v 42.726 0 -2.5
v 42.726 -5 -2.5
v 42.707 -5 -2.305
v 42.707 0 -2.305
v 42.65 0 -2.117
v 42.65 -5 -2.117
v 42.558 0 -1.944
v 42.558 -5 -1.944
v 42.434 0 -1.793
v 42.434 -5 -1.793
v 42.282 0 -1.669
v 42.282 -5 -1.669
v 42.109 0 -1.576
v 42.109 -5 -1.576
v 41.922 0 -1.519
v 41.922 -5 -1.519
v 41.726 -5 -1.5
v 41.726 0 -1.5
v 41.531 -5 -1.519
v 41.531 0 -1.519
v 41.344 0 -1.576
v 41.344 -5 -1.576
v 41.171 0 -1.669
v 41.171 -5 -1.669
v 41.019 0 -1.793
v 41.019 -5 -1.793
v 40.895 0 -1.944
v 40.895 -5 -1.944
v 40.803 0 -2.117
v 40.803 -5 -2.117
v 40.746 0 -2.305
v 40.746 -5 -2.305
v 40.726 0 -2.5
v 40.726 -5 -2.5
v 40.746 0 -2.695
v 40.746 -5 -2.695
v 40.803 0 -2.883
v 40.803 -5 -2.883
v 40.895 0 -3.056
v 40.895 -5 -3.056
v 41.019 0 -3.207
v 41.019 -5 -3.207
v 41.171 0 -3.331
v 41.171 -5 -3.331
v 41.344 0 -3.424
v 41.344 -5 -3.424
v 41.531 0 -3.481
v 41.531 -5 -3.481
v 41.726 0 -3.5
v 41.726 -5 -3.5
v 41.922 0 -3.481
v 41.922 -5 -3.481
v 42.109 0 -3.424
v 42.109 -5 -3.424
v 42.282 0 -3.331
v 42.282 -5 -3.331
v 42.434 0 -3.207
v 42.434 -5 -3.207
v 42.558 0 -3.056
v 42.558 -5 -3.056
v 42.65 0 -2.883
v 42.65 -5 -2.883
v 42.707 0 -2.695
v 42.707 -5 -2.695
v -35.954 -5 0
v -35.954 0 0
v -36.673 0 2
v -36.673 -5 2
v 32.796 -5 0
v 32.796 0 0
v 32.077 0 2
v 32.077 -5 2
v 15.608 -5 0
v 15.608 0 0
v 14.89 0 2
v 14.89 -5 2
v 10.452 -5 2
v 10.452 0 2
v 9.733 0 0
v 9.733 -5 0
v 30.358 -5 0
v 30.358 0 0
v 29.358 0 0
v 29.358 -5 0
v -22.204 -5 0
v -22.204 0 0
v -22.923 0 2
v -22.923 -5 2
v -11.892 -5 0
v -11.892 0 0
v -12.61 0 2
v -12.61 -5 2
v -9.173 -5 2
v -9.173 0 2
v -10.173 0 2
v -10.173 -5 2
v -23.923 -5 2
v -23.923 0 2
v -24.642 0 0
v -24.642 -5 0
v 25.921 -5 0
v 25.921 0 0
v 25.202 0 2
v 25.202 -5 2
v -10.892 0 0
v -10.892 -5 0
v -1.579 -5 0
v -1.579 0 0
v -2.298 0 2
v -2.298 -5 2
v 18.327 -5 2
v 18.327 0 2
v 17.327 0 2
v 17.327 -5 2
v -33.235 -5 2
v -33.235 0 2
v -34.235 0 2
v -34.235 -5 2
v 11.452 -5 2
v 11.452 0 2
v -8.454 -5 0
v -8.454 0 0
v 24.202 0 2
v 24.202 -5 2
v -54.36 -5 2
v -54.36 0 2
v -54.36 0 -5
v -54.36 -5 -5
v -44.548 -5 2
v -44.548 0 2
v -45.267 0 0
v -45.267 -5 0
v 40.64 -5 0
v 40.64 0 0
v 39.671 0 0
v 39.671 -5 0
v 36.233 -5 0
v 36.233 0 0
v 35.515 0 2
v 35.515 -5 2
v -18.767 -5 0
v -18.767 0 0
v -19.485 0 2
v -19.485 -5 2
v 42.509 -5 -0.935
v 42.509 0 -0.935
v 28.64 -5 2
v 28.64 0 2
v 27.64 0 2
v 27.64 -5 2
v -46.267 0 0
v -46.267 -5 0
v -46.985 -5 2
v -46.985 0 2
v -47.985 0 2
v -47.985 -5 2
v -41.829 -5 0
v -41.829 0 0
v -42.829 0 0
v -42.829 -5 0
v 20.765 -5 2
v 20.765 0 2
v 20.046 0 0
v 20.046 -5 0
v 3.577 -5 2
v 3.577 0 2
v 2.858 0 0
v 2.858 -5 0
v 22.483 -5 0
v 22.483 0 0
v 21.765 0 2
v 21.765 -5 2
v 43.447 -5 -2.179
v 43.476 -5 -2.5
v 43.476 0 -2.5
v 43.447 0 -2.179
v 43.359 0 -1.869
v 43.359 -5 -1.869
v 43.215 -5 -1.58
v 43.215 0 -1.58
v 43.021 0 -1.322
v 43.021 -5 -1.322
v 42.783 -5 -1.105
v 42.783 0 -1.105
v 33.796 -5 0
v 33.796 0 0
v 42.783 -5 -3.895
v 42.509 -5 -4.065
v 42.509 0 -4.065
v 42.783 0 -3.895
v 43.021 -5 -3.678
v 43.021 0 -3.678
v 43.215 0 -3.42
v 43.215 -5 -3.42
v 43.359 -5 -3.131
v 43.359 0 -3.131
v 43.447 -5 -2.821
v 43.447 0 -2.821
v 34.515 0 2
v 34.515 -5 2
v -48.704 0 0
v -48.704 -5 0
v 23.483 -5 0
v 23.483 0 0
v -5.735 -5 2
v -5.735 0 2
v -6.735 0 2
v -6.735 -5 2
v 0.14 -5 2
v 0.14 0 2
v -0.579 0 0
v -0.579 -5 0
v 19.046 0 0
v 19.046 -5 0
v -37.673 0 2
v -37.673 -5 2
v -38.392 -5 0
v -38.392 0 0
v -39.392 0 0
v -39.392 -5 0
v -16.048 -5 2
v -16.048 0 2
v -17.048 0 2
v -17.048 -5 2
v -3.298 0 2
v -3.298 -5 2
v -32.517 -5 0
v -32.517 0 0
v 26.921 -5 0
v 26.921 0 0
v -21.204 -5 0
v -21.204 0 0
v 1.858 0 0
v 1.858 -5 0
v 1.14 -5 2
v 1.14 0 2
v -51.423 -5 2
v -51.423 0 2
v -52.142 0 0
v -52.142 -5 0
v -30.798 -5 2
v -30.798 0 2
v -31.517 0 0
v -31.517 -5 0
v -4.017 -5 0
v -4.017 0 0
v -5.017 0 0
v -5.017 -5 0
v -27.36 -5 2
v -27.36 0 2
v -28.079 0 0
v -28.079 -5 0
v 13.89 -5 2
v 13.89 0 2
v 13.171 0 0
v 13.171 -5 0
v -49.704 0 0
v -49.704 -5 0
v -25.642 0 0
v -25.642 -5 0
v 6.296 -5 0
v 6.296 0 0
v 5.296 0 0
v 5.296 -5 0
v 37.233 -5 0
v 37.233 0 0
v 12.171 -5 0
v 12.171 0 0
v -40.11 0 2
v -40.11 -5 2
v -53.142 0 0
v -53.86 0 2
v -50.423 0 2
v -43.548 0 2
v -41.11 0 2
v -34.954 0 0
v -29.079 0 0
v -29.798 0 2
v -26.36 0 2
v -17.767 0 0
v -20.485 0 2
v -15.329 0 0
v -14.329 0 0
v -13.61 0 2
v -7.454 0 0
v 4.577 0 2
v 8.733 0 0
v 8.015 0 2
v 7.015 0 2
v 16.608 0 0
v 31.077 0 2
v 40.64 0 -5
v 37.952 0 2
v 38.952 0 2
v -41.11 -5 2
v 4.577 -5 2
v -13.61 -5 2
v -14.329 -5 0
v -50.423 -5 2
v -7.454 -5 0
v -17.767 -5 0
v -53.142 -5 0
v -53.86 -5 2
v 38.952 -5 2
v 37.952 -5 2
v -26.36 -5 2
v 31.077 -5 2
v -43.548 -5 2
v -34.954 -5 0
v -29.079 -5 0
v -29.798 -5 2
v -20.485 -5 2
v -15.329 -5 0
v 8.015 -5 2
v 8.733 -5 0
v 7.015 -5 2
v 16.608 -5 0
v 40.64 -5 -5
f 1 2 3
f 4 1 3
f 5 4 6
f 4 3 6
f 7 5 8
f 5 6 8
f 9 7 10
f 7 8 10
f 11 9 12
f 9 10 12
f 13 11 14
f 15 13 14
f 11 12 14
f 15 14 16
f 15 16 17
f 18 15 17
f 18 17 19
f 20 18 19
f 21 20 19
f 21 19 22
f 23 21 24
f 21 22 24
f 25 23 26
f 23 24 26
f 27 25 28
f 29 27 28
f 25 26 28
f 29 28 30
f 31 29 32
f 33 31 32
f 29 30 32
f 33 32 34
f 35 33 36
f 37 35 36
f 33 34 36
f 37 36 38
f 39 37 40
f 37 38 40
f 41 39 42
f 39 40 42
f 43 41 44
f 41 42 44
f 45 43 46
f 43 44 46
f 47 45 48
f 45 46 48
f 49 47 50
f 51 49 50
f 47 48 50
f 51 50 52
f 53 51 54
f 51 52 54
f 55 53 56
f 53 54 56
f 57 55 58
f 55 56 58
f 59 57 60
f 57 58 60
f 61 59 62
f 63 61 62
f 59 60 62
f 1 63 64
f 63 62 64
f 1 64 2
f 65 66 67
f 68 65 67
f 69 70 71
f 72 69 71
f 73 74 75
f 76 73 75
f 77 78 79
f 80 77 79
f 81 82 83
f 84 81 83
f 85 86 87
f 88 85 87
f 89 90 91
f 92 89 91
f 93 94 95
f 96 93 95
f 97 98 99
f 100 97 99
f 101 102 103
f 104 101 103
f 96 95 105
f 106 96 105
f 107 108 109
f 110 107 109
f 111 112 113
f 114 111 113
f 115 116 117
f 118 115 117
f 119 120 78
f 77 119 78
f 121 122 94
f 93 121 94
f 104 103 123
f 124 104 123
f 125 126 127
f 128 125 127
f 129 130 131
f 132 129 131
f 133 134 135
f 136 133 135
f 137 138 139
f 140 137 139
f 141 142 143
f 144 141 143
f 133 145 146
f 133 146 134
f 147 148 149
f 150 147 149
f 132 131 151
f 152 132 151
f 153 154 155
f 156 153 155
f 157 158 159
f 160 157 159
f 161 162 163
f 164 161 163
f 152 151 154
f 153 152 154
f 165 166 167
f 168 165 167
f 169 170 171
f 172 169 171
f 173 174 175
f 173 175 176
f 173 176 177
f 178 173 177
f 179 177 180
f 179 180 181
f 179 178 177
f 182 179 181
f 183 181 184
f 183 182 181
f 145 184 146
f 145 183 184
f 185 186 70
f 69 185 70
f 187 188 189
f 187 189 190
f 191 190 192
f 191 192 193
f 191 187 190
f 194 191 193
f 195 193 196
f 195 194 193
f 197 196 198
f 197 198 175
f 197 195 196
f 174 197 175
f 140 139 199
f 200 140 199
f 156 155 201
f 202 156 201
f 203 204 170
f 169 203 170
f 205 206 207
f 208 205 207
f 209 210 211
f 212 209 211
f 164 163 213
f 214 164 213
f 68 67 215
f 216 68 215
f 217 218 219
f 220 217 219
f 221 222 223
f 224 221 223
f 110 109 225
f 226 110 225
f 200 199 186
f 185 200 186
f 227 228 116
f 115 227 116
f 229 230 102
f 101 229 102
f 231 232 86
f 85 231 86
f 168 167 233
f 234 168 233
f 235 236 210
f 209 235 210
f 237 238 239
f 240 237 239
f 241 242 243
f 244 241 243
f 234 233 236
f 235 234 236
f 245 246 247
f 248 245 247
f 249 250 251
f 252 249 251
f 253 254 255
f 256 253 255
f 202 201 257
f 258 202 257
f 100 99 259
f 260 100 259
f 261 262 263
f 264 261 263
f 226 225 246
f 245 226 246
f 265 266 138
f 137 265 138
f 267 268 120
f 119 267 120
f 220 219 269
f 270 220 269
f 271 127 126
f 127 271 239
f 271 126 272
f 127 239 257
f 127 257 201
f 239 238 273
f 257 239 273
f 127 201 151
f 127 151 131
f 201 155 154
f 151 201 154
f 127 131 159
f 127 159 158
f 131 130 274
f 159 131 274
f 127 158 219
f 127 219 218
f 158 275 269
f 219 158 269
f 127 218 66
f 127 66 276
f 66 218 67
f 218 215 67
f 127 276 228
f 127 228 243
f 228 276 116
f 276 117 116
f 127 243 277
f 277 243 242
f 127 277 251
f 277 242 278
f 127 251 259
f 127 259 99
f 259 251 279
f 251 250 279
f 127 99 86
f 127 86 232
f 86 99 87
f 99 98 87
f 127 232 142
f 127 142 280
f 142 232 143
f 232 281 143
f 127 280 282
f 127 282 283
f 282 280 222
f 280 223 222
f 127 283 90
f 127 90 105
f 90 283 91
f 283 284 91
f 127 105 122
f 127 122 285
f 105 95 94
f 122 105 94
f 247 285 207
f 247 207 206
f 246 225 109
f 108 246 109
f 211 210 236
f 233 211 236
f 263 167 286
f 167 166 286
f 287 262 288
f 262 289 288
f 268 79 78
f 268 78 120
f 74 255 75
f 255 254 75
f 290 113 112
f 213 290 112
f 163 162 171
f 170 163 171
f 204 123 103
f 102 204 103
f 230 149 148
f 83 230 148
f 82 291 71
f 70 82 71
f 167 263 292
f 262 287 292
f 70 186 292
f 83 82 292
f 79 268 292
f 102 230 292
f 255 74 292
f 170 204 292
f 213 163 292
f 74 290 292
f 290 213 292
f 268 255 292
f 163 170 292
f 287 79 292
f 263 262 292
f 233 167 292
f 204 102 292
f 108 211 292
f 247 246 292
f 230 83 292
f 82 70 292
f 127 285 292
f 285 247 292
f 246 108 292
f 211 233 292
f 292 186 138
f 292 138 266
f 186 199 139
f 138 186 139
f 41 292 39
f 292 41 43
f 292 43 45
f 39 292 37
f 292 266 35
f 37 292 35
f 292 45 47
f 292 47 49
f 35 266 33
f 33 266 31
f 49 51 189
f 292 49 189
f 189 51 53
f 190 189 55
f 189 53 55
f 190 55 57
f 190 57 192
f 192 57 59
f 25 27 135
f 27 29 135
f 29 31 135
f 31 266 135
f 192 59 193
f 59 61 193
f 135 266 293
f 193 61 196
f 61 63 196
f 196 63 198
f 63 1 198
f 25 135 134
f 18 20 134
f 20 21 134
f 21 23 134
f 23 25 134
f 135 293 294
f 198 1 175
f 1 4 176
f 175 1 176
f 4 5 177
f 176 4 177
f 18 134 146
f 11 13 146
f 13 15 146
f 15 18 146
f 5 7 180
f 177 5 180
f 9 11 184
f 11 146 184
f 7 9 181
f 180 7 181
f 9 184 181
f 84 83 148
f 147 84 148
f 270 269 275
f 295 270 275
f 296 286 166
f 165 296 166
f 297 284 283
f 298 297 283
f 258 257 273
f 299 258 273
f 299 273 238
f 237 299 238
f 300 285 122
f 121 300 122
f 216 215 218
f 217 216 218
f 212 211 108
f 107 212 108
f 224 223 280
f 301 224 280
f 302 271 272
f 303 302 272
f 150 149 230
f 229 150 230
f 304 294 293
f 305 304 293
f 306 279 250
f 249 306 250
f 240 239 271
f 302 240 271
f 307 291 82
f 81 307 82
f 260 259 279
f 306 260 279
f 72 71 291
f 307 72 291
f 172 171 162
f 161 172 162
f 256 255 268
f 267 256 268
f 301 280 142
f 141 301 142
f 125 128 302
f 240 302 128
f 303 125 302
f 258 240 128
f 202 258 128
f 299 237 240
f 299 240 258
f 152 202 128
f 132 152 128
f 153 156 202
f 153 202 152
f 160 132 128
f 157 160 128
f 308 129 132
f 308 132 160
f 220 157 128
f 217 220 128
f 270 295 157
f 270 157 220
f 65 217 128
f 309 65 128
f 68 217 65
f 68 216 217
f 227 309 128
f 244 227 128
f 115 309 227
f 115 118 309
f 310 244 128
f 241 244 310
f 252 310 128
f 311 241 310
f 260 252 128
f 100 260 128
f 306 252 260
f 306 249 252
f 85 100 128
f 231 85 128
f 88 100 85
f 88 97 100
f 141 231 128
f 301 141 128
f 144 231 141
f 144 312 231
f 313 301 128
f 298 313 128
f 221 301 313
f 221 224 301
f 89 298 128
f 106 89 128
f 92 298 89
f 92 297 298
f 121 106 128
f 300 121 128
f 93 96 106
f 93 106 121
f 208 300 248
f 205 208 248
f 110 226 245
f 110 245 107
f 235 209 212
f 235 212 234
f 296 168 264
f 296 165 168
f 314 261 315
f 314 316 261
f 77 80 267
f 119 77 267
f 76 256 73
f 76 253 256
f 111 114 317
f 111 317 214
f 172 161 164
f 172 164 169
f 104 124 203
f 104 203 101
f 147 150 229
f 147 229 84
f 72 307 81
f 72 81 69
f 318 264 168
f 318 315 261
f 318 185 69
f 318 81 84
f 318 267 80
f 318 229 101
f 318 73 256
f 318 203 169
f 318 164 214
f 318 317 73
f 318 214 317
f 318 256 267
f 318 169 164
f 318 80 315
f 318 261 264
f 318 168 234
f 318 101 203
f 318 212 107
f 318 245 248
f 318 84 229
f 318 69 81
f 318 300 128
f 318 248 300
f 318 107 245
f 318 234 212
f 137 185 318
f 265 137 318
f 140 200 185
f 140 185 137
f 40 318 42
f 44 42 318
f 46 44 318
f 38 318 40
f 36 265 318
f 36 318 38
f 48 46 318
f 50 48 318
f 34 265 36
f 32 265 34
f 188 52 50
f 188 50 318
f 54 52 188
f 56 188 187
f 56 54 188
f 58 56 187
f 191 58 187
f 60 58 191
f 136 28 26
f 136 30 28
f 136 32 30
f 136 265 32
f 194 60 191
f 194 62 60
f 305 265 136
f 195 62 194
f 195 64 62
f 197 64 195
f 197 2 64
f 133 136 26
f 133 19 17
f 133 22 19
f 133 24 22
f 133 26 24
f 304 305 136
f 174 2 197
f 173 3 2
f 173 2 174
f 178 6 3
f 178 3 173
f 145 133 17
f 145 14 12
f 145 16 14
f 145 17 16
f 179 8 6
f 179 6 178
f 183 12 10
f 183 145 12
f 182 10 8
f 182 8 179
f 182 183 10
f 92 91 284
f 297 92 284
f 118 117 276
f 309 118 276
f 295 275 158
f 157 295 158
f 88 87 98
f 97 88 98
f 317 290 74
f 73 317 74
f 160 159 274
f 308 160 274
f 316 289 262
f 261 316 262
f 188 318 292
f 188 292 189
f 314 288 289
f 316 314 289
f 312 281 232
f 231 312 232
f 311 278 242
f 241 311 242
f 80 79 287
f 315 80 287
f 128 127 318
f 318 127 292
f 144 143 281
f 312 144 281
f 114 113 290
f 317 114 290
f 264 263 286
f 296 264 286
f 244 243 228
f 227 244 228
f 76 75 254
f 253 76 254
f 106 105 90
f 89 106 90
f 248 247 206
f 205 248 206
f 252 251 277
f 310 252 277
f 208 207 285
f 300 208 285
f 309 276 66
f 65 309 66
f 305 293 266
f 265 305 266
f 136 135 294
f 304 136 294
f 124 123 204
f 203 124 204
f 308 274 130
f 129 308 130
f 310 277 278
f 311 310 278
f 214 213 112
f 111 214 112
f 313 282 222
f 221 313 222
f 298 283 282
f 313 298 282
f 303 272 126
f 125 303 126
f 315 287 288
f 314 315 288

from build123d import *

# Parameters (mm, degrees)
F1_DEPTH = 5
F3_DEPTH = 25
F4_R     = 1
F5_DEPTH = 5


with BuildPart() as f1:
    # F0 (on Front) → F1 (new body)
    with BuildSketch(Plane.XZ):
        Polygon((-54.360465, 2), (-54.360465, 0), (-53.141715, 0), (-53.860465, 2), align=None)
        Polygon((-53.141715, 0), (-54.360465, 0), (-54.360465, -5), (55.639535, -5), (55.639535, 0), (54.420785, 0), (53.920785, 0), (53.420785, 0), (50.983285, 0), (50.483285, 0), (49.983285, 0), (47.545785, 0), (47.045785, 0), (46.545785, 0), (44.108285, 0), (43.608285, 0), (43.108285, 0), (40.670785, 0), (40.170785, 0), (39.670785, 0), (37.233285, 0), (36.733285, 0), (36.233285, 0), (33.795785, 0), (33.295785, 0), (32.795785, 0), (30.358285, 0), (29.858285, 0), (29.358285, 0), (26.920785, 0), (26.420785, 0), (25.920785, 0), (23.483285, 0), (22.983285, 0), (22.483285, 0), (20.045785, 0), (19.545785, 0), (19.045785, 0), (16.608285, 0), (16.108285, 0), (15.608285, 0), (13.170785, 0), (12.670785, 0), (12.170785, 0), (9.733285, 0), (9.233285, 0), (8.733285, 0), (6.295785, 0), (5.795785, 0), (5.295785, 0), (2.858285, 0), (2.358285, 0), (1.858285, 0), (-0.579215, 0), (-1.079215, 0), (-1.579215, 0), (-4.016715, 0), (-4.516715, 0), (-5.016715, 0), (-7.454215, 0), (-7.954215, 0), (-8.454215, 0), (-10.891715, 0), (-11.391715, 0), (-11.891715, 0), (-14.329215, 0), (-14.829215, 0), (-15.329215, 0), (-17.766715, 0), (-18.266715, 0), (-18.766715, 0), (-21.204215, 0), (-21.704215, 0), (-22.204215, 0), (-24.641715, 0), (-25.141715, 0), (-25.641715, 0), (-28.079215, 0), (-28.579215, 0), (-29.079215, 0), (-31.516715, 0), (-32.016715, 0), (-32.516715, 0), (-34.954215, 0), (-35.454215, 0), (-35.954215, 0), (-38.391715, 0), (-38.891715, 0), (-39.391715, 0), (-41.829215, 0), (-42.329215, 0), (-42.829215, 0), (-45.266715, 0), (-45.766715, 0), (-46.266715, 0), (-48.704215, 0), (-49.204215, 0), (-49.704215, 0), (-52.141715, 0), (-52.641715, 0), align=None)
        Polygon((-51.422965, 2), (-52.141715, 0), (-49.704215, 0), (-50.422965, 2), (-50.922965, 2), align=None)
        Polygon((54.420785, 0), (55.639535, 0), (55.639535, 2), (55.139535, 2), align=None)
        Polygon((-47.985465, 2), (-48.704215, 0), (-46.266715, 0), (-46.985465, 2), (-47.485465, 2), align=None)
        Polygon((50.983285, 0), (53.420785, 0), (52.702035, 2), (52.202035, 2), (51.702035, 2), align=None)
        Polygon((-44.547965, 2), (-45.266715, 0), (-42.829215, 0), (-43.547965, 2), (-44.047965, 2), align=None)
        Polygon((47.545785, 0), (49.983285, 0), (49.264535, 2), (48.764535, 2), (48.264535, 2), align=None)
        Polygon((-41.110465, 2), (-41.829215, 0), (-39.391715, 0), (-40.110465, 2), (-40.610465, 2), align=None)
        Polygon((44.108285, 0), (46.545785, 0), (45.827035, 2), (45.327035, 2), (44.827035, 2), align=None)
        Polygon((-37.672965, 2), (-38.391715, 0), (-35.954215, 0), (-36.672965, 2), (-37.172965, 2), align=None)
        Polygon((40.670785, 0), (43.108285, 0), (42.389535, 2), (41.889535, 2), (41.389535, 2), align=None)
        Polygon((-34.235465, 2), (-34.954215, 0), (-32.516715, 0), (-33.235465, 2), (-33.735465, 2), align=None)
        Polygon((37.233285, 0), (39.670785, 0), (38.952035, 2), (38.452035, 2), (37.952035, 2), align=None)
        Polygon((-30.797965, 2), (-31.516715, 0), (-29.079215, 0), (-29.797965, 2), (-30.297965, 2), align=None)
        Polygon((33.795785, 0), (36.233285, 0), (35.514535, 2), (35.014535, 2), (34.514535, 2), align=None)
        Polygon((-27.360465, 2), (-28.079215, 0), (-25.641715, 0), (-26.360465, 2), (-26.860465, 2), align=None)
        Polygon((30.358285, 0), (32.795785, 0), (32.077035, 2), (31.577035, 2), (31.077035, 2), align=None)
        Polygon((-23.922965, 2), (-24.641715, 0), (-22.204215, 0), (-22.922965, 2), (-23.422965, 2), align=None)
        Polygon((26.920785, 0), (29.358285, 0), (28.639535, 2), (28.139535, 2), (27.639535, 2), align=None)
        Polygon((-20.485465, 2), (-21.204215, 0), (-18.766715, 0), (-19.485465, 2), (-19.985465, 2), align=None)
        Polygon((23.483285, 0), (25.920785, 0), (25.202035, 2), (24.702035, 2), (24.202035, 2), align=None)
        Polygon((-17.047965, 2), (-17.766715, 0), (-15.329215, 0), (-16.047965, 2), (-16.547965, 2), align=None)
        Polygon((20.045785, 0), (22.483285, 0), (21.764535, 2), (21.264535, 2), (20.764535, 2), align=None)
        Polygon((-13.610465, 2), (-14.329215, 0), (-11.891715, 0), (-12.610465, 2), (-13.110465, 2), align=None)
        Polygon((16.608285, 0), (19.045785, 0), (18.327035, 2), (17.827035, 2), (17.327035, 2), align=None)
        Polygon((-10.172965, 2), (-10.891715, 0), (-8.454215, 0), (-9.172965, 2), (-9.672965, 2), align=None)
        Polygon((13.170785, 0), (15.608285, 0), (14.889535, 2), (14.389535, 2), (13.889535, 2), align=None)
        Polygon((-6.735465, 2), (-7.454215, 0), (-5.016715, 0), (-5.735465, 2), (-6.235465, 2), align=None)
        Polygon((9.733285, 0), (12.170785, 0), (11.452035, 2), (10.952035, 2), (10.452035, 2), align=None)
        Polygon((-3.297965, 2), (-4.016715, 0), (-1.579215, 0), (-2.297965, 2), (-2.797965, 2), align=None)
        Polygon((6.295785, 0), (8.733285, 0), (8.014535, 2), (7.514535, 2), (7.014535, 2), align=None)
        Polygon((0.139535, 2), (-0.579215, 0), (1.858285, 0), (1.139535, 2), (0.639535, 2), align=None)
        Polygon((2.858285, 0), (5.295785, 0), (4.577035, 2), (4.077035, 2), (3.577035, 2), align=None)
    extrude(amount=F1_DEPTH)

    # F2 (on face) → F3 (cut)
    with BuildSketch(Plane.XZ.offset(5)):
        Polygon((40.639535, 9.693892), (40.639535, -5), (40.639535, -8.513346), (59.679061, -8.513346), (59.679061, 9.693892), align=None)
    extrude(amount=-F3_DEPTH, mode=Mode.SUBTRACT)

    # F4 (on face) → F5 (join, through all)
    with BuildSketch(Plane.XZ.offset(5)):
        with BuildLine():
            Line((40.639535, 0), (40.639535, -5))
            Line((40.639535, -5), (42.509039, -4.065248))
            ThreePointArc((42.509039, -4.065248), (43.215055, -3.420029), (43.476416, -2.5))
            ThreePointArc((43.476416, -2.5), (43.215055, -1.579971), (42.509039, -0.934752))
            Line((42.509039, -0.934752), (40.639535, 0))
        make_face()
        with Locations((41.726416, -2.5)):
            Circle(F4_R, mode=Mode.SUBTRACT)
    extrude(amount=-F5_DEPTH)


solid = f1.part
